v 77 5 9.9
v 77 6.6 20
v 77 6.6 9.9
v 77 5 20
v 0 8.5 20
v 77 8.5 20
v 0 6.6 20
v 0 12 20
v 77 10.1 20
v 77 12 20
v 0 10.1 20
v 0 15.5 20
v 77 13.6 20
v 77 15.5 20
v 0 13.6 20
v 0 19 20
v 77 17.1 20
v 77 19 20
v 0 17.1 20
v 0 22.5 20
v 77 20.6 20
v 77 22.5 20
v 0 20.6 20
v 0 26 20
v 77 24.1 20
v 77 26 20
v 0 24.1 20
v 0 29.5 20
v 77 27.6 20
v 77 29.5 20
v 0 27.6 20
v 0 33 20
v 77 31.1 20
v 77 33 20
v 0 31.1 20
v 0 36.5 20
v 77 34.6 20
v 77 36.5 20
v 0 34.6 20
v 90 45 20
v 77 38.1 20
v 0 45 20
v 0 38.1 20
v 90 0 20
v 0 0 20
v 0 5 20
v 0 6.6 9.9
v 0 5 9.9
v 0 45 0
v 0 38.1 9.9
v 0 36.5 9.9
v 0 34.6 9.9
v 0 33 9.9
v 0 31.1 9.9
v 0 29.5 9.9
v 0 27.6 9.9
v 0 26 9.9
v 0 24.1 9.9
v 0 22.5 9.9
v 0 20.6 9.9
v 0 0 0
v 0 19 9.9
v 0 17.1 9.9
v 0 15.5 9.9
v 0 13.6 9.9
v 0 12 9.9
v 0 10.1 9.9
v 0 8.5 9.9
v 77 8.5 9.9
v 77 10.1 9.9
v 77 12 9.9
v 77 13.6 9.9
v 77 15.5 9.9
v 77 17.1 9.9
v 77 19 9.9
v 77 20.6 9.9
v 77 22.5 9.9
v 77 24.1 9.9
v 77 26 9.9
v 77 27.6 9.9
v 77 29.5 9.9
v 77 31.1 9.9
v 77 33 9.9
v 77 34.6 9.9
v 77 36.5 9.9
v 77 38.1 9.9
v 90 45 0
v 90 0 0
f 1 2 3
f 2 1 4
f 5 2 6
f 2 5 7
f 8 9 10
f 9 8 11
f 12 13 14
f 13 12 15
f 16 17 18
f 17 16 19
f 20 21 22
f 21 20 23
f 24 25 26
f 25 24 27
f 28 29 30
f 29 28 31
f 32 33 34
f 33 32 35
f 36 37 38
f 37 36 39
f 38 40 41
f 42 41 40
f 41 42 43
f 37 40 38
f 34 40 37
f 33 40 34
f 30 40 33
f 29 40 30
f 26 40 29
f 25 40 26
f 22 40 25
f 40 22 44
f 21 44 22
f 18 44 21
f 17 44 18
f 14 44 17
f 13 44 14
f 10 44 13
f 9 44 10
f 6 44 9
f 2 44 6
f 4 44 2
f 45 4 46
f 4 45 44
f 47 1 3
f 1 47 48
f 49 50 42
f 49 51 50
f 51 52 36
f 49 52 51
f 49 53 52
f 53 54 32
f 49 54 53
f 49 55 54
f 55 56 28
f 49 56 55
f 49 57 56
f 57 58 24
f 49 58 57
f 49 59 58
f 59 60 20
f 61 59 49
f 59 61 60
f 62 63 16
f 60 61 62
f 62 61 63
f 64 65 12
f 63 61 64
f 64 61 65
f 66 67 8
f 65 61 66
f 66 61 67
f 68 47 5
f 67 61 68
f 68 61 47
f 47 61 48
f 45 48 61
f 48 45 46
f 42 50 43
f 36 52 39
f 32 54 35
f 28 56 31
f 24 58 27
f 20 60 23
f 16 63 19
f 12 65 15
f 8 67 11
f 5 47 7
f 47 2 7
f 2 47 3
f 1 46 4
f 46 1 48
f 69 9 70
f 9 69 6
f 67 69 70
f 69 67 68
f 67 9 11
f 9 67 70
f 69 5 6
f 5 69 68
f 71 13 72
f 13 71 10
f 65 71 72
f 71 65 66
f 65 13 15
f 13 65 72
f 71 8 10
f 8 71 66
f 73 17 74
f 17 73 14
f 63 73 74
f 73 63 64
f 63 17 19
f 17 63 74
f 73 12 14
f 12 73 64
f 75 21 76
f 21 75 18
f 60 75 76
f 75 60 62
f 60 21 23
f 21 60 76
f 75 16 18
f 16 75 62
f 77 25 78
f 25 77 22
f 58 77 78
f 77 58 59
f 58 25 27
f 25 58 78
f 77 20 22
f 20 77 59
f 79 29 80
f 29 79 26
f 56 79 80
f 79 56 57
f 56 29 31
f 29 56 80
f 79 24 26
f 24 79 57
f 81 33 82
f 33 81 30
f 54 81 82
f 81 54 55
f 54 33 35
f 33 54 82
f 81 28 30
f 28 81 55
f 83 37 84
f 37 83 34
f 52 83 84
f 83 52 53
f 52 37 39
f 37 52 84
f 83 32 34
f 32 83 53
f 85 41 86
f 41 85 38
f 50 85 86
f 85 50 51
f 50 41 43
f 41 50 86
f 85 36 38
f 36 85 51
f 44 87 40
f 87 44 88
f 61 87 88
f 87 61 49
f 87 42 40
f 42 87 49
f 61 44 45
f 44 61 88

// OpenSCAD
$fn = 64;

// Dimensions (mm)
block_x = 90;
block_y = 45;
block_z = 20;
slot_length = 77;
slot_width = 1.6;
slot_depth = 10;
slot_spacing = 3.5;
num_slots = 10;

// Calculations for centering the slots
total_slot_width = num_slots * slot_spacing;
first_slot_y = (block_y / 2) - (total_slot_width / 2);

module rack() {
    difference() {
        // Base Block
        cube([block_x, block_y, block_z], center=false);

        // Slots
        for (i = [0 : num_slots - 1]) {
            // Calculate Y position for this slot
            current_y = first_slot_y + (i * slot_spacing);

            // The cutting shape (void)
            // We extend the depth by 0.1mm to ensure it cuts past the top face
            // as per the "extend past faces" rule
            void_depth = slot_depth + 0.1;
            
            translate([0, current_y, block_z - void_depth])
                cube([slot_length, slot_width, void_depth], center=false);
        }
    }
}

rack();
